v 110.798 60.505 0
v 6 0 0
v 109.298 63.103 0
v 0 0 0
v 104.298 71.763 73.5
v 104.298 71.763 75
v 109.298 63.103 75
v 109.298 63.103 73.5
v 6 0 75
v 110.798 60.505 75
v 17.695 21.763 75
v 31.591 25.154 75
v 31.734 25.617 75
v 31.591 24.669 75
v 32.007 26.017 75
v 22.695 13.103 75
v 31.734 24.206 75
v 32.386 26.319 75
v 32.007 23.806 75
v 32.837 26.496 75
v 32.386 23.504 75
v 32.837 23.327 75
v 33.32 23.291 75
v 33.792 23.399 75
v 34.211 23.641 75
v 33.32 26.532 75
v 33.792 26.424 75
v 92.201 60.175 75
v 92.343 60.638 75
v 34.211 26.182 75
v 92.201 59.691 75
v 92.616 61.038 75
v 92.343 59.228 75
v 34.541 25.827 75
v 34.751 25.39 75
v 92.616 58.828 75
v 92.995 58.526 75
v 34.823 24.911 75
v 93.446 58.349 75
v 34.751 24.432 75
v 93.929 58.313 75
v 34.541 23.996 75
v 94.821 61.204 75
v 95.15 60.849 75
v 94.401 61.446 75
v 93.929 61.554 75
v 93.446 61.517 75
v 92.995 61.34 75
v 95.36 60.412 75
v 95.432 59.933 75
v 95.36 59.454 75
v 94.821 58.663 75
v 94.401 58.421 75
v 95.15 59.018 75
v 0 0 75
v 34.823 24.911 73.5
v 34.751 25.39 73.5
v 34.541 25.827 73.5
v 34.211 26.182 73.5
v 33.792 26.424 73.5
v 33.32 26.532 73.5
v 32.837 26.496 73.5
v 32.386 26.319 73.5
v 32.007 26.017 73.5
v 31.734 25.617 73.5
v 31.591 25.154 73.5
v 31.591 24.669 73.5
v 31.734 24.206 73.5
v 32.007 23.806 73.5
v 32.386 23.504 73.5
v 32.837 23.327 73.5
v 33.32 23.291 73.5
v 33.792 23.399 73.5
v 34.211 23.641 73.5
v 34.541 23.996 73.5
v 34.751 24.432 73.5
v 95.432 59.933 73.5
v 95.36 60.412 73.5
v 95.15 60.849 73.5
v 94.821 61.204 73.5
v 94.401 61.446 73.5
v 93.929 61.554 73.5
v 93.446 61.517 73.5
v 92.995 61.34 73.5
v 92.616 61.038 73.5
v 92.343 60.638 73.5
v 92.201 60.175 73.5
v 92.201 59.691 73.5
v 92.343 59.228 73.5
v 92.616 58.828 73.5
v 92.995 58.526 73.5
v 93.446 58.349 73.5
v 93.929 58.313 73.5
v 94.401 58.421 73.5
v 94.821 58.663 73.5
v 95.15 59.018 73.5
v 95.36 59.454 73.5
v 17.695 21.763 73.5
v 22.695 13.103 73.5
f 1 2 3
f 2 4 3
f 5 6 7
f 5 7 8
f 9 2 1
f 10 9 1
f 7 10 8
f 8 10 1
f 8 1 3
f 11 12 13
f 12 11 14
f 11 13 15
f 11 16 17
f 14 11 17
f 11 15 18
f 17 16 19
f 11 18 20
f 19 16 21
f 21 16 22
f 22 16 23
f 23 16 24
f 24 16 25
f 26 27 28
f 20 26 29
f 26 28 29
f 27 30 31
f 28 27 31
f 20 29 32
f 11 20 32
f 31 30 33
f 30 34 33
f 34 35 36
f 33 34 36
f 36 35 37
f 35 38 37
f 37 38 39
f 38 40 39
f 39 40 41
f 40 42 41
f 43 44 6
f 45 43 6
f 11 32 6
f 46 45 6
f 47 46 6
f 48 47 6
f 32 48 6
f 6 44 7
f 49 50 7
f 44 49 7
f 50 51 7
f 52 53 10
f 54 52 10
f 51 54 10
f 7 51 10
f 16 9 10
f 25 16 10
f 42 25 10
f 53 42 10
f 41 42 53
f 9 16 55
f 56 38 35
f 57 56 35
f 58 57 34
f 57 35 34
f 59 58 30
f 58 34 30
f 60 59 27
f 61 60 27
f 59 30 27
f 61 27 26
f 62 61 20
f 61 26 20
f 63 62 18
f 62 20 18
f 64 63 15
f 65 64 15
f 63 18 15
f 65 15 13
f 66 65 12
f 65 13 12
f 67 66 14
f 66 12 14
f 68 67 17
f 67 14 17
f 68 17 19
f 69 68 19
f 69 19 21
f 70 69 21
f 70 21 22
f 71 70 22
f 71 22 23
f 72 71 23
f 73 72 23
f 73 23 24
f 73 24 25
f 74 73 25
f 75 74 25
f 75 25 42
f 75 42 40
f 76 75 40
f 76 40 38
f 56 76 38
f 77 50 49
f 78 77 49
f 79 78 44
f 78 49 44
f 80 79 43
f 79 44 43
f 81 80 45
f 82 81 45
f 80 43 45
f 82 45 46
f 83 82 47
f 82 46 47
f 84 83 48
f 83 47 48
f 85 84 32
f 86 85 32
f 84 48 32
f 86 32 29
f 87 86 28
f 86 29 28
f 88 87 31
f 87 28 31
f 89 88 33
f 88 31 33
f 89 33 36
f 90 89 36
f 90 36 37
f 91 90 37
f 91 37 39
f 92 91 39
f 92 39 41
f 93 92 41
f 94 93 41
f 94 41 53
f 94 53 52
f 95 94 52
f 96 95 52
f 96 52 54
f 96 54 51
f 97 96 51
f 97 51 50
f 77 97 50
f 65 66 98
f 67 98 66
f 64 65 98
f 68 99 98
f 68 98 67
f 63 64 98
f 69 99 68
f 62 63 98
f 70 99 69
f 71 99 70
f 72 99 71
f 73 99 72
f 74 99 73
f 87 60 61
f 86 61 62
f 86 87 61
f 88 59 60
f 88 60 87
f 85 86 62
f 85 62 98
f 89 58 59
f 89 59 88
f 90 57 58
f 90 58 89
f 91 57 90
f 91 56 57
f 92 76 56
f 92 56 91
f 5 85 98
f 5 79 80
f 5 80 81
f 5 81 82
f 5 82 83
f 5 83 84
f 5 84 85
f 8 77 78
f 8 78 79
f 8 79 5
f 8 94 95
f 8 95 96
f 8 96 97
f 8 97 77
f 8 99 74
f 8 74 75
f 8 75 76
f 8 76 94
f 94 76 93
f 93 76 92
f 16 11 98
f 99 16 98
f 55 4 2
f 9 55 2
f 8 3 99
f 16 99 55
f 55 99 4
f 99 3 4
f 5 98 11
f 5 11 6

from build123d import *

# Parameters (mm, degrees)
BOSS_EXTRUDE1_DEPTH = 75
SKETCH2_W           = 100
SKETCH2_H           = 1.5
BOSS_EXTRUDE2_DEPTH = 10
SKETCH3_R           = 1.625
CUT_EXTRUDE1_DEPTH  = 152.825931424


with BuildPart() as part:
    # Sketch1 → Boss-Extrude1 (new body)
    with BuildSketch(Plane.XY):
        Polygon((0, 0), (6, 0), (110.797734112, 60.505), (109.297734112, 63.103076211), align=None)
    extrude(amount=BOSS_EXTRUDE1_DEPTH)

    # Sketch2 → Boss-Extrude2 (add)
    with BuildSketch(Plane(origin=(0, 0, 0), x_dir=(0.866025403784438, 0.5000000000000012, 0), z_dir=(-0.5000000000000011, 0.8660254037844379, 0))):
        with Locations((76.206152423, -74.25)):
            Rectangle(SKETCH2_W, SKETCH2_H)
    extrude(amount=BOSS_EXTRUDE2_DEPTH)

    # Sketch3 → Cut-Extrude1 (cut, through all)
    with BuildSketch(Plane.XY.offset(75)):
        with Locations((33.198138972, 24.911441429)):
            Circle(SKETCH3_R)
        with Locations((93.807353055, 59.93320323)):
            Circle(SKETCH3_R)
    extrude(amount=-CUT_EXTRUDE1_DEPTH, mode=Mode.SUBTRACT)


solid = part.part
